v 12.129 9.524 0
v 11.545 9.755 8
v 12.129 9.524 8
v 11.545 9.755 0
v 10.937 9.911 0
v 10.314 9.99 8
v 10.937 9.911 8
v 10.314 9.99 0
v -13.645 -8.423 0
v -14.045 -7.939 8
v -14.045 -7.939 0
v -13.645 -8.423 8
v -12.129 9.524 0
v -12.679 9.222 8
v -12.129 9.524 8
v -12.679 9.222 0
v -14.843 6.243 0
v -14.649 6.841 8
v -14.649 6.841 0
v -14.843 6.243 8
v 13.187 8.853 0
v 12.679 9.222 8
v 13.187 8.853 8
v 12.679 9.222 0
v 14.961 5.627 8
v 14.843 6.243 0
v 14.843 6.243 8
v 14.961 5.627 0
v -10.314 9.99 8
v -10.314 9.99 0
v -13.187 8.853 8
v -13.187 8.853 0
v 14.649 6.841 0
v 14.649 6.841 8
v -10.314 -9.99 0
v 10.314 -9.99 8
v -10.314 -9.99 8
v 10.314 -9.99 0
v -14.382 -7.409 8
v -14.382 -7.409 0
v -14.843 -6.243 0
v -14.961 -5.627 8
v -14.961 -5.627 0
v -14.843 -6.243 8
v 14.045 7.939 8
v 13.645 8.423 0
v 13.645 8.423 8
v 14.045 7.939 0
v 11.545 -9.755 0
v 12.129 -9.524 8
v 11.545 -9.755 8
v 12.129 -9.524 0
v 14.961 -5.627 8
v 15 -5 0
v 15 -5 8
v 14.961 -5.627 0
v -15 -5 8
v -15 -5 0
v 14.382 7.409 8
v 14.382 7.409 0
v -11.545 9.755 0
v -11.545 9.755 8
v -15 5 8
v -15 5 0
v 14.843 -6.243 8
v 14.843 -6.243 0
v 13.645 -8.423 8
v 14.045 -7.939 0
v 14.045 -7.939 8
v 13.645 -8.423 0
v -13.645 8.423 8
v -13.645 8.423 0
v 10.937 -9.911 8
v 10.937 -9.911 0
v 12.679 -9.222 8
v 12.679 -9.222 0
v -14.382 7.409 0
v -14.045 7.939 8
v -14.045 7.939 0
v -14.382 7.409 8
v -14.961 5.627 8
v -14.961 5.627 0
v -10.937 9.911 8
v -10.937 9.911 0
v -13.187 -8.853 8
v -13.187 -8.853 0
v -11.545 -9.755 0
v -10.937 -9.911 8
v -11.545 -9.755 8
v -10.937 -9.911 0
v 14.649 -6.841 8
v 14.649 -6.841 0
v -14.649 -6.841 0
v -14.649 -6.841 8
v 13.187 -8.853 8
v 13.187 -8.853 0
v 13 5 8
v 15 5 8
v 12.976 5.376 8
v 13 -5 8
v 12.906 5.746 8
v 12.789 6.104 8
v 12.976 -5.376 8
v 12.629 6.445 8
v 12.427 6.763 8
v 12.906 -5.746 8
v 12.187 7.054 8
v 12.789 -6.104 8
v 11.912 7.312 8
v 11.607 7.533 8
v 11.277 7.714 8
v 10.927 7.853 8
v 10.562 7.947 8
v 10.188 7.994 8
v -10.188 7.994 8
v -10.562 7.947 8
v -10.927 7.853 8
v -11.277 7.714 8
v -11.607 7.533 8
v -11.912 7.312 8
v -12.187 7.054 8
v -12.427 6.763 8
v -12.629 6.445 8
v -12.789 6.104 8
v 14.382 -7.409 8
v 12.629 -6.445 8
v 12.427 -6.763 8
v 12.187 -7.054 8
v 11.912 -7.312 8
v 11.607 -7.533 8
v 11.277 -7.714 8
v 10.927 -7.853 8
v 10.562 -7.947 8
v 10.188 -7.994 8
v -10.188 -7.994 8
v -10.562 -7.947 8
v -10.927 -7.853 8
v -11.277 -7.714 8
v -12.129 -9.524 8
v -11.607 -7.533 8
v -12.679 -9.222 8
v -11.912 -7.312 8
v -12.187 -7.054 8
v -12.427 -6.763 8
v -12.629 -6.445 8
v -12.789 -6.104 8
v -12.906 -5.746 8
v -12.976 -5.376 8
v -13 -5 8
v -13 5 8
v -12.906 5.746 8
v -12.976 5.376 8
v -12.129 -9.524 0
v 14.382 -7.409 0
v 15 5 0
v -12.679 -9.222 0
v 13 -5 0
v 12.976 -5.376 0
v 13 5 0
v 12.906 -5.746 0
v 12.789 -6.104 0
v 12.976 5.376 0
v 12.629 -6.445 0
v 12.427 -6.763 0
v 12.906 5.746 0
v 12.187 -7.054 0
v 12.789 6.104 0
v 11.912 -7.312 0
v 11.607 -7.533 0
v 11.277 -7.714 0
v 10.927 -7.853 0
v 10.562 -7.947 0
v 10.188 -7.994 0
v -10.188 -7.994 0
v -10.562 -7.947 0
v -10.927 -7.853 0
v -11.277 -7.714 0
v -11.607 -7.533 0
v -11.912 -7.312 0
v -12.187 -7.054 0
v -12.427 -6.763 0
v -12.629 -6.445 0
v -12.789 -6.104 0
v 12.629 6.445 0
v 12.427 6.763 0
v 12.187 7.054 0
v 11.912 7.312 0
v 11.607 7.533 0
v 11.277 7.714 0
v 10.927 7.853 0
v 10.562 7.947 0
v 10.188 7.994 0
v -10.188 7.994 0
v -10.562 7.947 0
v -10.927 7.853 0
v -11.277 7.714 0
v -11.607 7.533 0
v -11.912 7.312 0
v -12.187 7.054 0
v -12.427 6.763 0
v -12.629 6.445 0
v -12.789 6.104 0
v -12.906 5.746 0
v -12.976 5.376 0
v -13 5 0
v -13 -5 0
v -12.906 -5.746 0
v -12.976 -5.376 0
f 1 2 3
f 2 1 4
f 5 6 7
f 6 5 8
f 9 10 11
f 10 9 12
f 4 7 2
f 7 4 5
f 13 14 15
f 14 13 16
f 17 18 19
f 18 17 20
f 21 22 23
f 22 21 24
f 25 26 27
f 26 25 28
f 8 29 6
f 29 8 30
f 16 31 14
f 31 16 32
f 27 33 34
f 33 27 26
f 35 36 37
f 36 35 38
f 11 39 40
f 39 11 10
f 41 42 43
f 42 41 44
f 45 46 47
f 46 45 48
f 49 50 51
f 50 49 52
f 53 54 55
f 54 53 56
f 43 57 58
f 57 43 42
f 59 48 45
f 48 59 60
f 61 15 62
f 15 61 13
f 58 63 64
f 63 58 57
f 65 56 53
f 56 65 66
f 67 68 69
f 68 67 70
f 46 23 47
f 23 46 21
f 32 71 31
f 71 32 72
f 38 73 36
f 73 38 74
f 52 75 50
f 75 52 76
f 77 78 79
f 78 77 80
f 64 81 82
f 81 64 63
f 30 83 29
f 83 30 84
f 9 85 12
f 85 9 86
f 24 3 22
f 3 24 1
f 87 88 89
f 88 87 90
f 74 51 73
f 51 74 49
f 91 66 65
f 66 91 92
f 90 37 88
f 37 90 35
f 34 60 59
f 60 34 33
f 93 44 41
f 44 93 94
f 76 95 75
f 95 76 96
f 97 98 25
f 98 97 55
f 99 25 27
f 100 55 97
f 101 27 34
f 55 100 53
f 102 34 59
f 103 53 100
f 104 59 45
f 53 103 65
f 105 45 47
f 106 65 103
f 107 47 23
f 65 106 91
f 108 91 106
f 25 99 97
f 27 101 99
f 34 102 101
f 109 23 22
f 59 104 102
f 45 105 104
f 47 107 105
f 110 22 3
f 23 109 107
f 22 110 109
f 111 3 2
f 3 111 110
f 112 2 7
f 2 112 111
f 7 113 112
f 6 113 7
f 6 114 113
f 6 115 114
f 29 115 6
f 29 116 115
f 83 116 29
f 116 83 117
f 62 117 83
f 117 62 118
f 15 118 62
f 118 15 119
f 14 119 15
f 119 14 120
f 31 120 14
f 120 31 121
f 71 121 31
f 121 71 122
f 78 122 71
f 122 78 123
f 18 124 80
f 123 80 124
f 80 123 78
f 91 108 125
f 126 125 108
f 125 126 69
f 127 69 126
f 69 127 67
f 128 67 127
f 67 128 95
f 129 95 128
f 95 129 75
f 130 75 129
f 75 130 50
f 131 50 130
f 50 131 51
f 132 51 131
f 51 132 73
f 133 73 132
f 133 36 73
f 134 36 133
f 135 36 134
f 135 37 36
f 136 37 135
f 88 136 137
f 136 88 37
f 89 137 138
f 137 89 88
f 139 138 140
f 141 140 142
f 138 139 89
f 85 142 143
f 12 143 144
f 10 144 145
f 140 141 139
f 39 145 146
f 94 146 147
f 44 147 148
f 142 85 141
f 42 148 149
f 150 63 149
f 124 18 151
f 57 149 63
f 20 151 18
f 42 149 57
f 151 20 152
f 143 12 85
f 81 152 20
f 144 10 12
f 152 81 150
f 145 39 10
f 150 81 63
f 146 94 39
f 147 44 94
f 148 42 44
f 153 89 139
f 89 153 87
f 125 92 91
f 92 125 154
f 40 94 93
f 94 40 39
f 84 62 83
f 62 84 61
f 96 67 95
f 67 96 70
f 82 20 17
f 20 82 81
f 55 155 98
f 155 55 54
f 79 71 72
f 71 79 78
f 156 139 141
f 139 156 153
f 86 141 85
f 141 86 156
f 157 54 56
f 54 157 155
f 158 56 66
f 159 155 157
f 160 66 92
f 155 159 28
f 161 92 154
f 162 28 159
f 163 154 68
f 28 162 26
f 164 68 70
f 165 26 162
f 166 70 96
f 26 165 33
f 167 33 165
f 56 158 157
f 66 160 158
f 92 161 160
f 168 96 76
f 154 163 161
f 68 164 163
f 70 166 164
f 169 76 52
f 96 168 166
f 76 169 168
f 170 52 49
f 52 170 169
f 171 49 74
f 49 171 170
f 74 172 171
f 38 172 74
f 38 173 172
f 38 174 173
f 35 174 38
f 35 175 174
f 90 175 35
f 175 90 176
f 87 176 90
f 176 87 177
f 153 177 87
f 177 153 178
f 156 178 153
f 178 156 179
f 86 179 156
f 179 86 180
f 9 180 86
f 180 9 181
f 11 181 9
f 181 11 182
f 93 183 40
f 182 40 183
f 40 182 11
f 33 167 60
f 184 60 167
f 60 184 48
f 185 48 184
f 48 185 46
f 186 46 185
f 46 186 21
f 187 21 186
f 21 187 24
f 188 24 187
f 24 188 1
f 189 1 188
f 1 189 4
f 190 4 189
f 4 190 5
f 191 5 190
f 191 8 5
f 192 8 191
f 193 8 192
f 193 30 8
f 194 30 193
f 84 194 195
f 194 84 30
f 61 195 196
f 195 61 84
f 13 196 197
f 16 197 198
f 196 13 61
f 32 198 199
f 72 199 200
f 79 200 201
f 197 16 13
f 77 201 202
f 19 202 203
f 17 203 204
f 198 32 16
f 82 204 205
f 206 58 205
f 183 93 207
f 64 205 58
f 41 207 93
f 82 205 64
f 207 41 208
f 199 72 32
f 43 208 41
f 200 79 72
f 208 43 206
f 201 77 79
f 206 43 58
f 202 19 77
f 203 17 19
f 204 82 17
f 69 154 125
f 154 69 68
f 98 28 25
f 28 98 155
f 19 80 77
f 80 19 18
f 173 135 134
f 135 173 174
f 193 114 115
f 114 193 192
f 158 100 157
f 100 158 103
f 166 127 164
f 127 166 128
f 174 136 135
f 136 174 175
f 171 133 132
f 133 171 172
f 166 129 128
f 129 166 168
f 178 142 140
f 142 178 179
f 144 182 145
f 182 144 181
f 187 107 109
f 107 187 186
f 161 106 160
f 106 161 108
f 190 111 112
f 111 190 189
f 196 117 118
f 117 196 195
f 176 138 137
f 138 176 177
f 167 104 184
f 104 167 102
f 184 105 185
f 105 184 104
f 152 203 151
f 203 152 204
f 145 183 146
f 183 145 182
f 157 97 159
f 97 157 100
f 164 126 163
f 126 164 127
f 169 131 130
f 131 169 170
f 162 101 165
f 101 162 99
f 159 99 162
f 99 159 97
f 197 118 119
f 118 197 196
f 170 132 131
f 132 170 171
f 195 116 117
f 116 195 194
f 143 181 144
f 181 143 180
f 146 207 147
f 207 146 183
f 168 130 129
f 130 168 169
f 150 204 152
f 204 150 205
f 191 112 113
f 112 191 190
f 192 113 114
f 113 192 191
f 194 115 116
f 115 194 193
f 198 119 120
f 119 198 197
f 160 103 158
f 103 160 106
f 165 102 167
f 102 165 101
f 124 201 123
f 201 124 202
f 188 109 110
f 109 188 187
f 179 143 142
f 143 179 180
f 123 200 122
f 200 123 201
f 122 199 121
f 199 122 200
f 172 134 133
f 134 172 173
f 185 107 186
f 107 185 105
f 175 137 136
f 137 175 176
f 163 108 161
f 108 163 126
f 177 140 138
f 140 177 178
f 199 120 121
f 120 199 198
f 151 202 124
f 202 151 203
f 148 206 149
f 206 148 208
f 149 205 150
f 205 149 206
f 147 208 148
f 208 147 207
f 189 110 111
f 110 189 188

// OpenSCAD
$fn = 50;

difference() {
	union() {
		translate(v = [0, 0, 0]) {
			rotate(a = [0, 0, 0]) {
				difference() {
					union() {
						hull() {
							translate(v = [-10.0, 5.0, 0]) {
								cylinder(h = 8, r = 5);
							}
							translate(v = [10.0, 5.0, 0]) {
								cylinder(h = 8, r = 5);
							}
							translate(v = [-10.0, -5.0, 0]) {
								cylinder(h = 8, r = 5);
							}
							translate(v = [10.0, -5.0, 0]) {
								cylinder(h = 8, r = 5);
							}
						}
					}
					union() {
						hull() {
							translate(v = [-10.0, 5.0, 0]) {
								cylinder(h = 8, r = 3);
							}
							translate(v = [10.0, 5.0, 0]) {
								cylinder(h = 8, r = 3);
							}
							translate(v = [-10.0, -5.0, 0]) {
								cylinder(h = 8, r = 3);
							}
							translate(v = [10.0, -5.0, 0]) {
								cylinder(h = 8, r = 3);
							}
						}
					}
				}
			}
		}
	}
	union();
}
